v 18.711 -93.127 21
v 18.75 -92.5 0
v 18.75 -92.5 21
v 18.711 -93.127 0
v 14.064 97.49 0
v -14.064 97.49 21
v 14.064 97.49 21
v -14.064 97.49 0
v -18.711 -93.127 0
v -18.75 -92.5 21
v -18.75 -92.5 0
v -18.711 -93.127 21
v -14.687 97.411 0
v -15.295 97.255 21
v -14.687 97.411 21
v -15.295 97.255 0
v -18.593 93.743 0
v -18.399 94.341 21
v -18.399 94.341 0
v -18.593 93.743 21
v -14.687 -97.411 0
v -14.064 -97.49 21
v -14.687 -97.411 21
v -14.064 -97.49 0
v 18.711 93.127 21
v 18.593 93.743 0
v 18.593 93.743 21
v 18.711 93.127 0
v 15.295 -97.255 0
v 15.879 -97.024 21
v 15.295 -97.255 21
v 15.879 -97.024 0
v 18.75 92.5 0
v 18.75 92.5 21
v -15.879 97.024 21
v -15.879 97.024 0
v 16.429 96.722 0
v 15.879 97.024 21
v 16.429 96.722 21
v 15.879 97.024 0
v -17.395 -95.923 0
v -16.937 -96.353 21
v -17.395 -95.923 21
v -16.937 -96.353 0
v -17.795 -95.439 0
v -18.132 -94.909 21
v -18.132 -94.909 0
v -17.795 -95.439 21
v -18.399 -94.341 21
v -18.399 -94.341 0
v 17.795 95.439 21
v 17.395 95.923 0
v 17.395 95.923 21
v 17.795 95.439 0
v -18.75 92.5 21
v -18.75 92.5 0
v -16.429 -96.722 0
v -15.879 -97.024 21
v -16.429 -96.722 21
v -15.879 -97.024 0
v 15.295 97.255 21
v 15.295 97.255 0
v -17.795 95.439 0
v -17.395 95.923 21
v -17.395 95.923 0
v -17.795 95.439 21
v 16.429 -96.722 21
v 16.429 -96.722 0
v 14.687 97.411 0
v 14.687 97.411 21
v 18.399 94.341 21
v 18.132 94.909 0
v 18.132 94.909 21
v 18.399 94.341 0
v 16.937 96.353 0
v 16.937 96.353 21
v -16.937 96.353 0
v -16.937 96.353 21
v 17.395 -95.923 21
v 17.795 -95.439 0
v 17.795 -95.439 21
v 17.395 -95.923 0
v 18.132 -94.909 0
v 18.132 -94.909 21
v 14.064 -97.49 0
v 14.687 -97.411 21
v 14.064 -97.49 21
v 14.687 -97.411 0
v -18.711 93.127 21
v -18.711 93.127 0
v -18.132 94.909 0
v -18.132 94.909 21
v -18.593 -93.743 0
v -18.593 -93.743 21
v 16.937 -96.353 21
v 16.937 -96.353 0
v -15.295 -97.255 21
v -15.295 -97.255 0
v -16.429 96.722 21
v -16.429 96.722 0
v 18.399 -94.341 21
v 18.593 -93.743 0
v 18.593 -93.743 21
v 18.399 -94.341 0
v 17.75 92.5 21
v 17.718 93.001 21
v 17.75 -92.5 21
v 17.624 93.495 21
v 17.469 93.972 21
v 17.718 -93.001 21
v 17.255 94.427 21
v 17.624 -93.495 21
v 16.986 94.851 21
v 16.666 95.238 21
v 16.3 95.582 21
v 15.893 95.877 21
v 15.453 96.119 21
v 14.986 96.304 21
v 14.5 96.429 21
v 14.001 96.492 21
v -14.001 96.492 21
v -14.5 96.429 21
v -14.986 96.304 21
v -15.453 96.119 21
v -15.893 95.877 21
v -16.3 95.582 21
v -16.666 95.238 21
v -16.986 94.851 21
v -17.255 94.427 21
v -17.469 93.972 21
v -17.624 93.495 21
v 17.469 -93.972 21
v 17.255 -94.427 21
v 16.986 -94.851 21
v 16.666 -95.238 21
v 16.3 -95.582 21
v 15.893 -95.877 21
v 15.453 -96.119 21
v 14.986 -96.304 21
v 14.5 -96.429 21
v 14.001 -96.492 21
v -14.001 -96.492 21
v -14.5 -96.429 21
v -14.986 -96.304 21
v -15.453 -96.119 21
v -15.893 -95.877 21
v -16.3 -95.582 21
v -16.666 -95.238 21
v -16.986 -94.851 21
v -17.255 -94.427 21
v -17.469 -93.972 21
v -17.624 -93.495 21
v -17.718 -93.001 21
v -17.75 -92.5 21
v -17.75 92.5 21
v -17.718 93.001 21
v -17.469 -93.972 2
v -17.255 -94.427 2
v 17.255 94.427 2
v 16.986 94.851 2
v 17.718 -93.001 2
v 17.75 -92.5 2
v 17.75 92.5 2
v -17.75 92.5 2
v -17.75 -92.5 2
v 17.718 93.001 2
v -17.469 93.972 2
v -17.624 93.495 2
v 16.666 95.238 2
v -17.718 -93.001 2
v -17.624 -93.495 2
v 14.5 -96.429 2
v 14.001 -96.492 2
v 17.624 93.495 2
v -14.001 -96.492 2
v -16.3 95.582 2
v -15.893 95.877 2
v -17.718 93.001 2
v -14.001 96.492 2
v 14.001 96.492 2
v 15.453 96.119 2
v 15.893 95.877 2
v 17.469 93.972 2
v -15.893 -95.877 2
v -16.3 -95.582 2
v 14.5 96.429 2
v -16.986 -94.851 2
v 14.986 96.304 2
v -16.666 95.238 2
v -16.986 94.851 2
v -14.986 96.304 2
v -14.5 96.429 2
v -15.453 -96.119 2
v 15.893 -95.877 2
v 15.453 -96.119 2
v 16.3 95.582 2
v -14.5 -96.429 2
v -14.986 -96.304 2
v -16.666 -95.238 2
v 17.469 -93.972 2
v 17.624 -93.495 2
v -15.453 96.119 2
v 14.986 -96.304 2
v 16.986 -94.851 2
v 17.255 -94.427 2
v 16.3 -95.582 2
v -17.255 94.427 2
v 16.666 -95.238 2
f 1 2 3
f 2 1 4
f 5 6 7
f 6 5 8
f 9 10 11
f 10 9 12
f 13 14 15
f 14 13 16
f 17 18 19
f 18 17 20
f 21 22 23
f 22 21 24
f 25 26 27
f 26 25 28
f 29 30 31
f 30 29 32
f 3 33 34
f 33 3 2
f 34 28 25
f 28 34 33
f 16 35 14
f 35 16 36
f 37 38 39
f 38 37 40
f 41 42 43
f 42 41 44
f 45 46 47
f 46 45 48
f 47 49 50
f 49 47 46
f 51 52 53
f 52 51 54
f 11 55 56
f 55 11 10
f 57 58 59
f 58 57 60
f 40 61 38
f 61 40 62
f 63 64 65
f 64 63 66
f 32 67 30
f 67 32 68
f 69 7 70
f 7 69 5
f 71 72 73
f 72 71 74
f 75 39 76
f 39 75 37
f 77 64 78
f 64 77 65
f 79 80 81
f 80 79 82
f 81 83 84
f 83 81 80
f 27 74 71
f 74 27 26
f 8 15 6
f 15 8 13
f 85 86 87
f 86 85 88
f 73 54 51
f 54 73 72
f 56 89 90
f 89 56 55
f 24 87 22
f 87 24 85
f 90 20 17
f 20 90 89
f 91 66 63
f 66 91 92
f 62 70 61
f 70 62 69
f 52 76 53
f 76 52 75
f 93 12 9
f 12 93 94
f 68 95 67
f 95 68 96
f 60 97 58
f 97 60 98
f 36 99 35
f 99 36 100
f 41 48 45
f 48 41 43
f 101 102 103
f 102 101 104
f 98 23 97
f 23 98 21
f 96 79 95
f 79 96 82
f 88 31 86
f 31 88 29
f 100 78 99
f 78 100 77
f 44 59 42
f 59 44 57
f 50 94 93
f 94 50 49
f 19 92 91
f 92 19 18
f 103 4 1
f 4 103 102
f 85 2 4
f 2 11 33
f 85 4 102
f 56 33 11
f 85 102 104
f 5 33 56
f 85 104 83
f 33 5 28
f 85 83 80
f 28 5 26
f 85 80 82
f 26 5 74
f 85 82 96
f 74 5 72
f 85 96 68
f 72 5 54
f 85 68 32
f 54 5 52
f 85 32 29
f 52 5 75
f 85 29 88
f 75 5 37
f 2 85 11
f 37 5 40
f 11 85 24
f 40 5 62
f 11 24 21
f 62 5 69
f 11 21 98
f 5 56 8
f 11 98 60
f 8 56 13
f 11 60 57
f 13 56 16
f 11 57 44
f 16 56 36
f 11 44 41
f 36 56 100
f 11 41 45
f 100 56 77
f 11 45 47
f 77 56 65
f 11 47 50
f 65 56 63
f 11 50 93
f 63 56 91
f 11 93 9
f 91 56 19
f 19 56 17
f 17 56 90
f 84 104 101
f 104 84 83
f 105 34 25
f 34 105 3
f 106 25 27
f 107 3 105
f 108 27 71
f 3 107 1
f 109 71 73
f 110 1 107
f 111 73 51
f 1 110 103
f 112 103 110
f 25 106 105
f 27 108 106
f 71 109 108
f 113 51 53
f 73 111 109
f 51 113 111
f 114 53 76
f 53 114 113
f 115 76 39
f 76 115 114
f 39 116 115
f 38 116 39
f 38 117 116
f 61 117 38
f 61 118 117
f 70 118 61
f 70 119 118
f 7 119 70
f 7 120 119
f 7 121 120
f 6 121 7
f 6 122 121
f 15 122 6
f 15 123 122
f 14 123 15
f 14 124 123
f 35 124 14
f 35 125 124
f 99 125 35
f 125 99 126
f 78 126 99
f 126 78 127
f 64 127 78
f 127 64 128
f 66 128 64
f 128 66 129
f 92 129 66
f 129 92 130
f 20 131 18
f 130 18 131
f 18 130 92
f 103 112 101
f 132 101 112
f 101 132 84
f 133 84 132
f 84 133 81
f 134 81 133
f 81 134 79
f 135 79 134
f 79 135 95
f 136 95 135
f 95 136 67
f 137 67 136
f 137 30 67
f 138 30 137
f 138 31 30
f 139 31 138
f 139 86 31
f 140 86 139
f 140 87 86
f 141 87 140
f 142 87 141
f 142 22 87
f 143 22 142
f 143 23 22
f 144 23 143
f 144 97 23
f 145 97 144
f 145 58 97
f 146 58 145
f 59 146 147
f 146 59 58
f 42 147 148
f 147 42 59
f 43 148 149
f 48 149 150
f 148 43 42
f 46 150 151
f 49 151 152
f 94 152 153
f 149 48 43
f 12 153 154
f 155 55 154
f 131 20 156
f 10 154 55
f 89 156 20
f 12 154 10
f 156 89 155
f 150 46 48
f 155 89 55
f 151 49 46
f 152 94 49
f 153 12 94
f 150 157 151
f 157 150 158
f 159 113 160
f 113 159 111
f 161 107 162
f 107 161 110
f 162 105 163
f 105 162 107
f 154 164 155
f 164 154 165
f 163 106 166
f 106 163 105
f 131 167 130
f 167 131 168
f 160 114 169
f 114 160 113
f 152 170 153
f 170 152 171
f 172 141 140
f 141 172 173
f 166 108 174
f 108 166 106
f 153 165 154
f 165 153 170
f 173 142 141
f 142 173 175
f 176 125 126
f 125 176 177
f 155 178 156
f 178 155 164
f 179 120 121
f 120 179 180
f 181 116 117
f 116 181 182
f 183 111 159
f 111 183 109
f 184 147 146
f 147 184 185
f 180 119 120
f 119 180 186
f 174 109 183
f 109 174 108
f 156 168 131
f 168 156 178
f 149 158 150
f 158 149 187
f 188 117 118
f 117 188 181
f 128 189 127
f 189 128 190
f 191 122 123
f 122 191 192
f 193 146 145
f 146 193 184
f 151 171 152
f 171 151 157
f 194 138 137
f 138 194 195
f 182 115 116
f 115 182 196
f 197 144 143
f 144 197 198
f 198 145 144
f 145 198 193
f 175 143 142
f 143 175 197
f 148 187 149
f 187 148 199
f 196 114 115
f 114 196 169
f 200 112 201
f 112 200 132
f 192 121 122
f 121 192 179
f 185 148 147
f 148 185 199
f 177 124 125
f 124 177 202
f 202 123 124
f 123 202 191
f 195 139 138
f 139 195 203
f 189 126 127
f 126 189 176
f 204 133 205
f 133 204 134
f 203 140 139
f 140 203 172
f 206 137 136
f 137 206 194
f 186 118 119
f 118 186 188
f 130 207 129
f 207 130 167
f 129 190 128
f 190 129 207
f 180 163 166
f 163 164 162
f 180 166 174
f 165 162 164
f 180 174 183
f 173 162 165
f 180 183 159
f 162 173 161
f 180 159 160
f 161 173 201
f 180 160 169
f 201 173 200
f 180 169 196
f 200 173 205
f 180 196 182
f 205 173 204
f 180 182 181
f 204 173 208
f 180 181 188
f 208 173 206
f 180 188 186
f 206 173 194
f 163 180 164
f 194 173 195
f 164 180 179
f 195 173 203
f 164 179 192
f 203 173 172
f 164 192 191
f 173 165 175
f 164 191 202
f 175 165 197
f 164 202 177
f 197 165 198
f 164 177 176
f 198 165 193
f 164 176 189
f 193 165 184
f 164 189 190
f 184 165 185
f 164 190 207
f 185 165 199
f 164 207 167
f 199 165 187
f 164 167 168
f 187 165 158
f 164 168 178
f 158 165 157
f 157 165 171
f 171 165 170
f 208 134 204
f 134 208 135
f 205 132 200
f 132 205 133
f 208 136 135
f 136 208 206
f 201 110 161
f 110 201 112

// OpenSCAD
$fn = 50;


difference() {
	union() {
		hull() {
			translate(v = [-13.7500000000, 92.5000000000, 0]) {
				cylinder(h = 21, r = 5);
			}
			translate(v = [13.7500000000, 92.5000000000, 0]) {
				cylinder(h = 21, r = 5);
			}
			translate(v = [-13.7500000000, -92.5000000000, 0]) {
				cylinder(h = 21, r = 5);
			}
			translate(v = [13.7500000000, -92.5000000000, 0]) {
				cylinder(h = 21, r = 5);
			}
		}
	}
	union() {
		translate(v = [0, 0, 2]) {
			hull() {
				translate(v = [-13.7500000000, 92.5000000000, 0]) {
					cylinder(h = 19, r = 4);
				}
				translate(v = [13.7500000000, 92.5000000000, 0]) {
					cylinder(h = 19, r = 4);
				}
				translate(v = [-13.7500000000, -92.5000000000, 0]) {
					cylinder(h = 19, r = 4);
				}
				translate(v = [13.7500000000, -92.5000000000, 0]) {
					cylinder(h = 19, r = 4);
				}
			}
		}
	}
}
